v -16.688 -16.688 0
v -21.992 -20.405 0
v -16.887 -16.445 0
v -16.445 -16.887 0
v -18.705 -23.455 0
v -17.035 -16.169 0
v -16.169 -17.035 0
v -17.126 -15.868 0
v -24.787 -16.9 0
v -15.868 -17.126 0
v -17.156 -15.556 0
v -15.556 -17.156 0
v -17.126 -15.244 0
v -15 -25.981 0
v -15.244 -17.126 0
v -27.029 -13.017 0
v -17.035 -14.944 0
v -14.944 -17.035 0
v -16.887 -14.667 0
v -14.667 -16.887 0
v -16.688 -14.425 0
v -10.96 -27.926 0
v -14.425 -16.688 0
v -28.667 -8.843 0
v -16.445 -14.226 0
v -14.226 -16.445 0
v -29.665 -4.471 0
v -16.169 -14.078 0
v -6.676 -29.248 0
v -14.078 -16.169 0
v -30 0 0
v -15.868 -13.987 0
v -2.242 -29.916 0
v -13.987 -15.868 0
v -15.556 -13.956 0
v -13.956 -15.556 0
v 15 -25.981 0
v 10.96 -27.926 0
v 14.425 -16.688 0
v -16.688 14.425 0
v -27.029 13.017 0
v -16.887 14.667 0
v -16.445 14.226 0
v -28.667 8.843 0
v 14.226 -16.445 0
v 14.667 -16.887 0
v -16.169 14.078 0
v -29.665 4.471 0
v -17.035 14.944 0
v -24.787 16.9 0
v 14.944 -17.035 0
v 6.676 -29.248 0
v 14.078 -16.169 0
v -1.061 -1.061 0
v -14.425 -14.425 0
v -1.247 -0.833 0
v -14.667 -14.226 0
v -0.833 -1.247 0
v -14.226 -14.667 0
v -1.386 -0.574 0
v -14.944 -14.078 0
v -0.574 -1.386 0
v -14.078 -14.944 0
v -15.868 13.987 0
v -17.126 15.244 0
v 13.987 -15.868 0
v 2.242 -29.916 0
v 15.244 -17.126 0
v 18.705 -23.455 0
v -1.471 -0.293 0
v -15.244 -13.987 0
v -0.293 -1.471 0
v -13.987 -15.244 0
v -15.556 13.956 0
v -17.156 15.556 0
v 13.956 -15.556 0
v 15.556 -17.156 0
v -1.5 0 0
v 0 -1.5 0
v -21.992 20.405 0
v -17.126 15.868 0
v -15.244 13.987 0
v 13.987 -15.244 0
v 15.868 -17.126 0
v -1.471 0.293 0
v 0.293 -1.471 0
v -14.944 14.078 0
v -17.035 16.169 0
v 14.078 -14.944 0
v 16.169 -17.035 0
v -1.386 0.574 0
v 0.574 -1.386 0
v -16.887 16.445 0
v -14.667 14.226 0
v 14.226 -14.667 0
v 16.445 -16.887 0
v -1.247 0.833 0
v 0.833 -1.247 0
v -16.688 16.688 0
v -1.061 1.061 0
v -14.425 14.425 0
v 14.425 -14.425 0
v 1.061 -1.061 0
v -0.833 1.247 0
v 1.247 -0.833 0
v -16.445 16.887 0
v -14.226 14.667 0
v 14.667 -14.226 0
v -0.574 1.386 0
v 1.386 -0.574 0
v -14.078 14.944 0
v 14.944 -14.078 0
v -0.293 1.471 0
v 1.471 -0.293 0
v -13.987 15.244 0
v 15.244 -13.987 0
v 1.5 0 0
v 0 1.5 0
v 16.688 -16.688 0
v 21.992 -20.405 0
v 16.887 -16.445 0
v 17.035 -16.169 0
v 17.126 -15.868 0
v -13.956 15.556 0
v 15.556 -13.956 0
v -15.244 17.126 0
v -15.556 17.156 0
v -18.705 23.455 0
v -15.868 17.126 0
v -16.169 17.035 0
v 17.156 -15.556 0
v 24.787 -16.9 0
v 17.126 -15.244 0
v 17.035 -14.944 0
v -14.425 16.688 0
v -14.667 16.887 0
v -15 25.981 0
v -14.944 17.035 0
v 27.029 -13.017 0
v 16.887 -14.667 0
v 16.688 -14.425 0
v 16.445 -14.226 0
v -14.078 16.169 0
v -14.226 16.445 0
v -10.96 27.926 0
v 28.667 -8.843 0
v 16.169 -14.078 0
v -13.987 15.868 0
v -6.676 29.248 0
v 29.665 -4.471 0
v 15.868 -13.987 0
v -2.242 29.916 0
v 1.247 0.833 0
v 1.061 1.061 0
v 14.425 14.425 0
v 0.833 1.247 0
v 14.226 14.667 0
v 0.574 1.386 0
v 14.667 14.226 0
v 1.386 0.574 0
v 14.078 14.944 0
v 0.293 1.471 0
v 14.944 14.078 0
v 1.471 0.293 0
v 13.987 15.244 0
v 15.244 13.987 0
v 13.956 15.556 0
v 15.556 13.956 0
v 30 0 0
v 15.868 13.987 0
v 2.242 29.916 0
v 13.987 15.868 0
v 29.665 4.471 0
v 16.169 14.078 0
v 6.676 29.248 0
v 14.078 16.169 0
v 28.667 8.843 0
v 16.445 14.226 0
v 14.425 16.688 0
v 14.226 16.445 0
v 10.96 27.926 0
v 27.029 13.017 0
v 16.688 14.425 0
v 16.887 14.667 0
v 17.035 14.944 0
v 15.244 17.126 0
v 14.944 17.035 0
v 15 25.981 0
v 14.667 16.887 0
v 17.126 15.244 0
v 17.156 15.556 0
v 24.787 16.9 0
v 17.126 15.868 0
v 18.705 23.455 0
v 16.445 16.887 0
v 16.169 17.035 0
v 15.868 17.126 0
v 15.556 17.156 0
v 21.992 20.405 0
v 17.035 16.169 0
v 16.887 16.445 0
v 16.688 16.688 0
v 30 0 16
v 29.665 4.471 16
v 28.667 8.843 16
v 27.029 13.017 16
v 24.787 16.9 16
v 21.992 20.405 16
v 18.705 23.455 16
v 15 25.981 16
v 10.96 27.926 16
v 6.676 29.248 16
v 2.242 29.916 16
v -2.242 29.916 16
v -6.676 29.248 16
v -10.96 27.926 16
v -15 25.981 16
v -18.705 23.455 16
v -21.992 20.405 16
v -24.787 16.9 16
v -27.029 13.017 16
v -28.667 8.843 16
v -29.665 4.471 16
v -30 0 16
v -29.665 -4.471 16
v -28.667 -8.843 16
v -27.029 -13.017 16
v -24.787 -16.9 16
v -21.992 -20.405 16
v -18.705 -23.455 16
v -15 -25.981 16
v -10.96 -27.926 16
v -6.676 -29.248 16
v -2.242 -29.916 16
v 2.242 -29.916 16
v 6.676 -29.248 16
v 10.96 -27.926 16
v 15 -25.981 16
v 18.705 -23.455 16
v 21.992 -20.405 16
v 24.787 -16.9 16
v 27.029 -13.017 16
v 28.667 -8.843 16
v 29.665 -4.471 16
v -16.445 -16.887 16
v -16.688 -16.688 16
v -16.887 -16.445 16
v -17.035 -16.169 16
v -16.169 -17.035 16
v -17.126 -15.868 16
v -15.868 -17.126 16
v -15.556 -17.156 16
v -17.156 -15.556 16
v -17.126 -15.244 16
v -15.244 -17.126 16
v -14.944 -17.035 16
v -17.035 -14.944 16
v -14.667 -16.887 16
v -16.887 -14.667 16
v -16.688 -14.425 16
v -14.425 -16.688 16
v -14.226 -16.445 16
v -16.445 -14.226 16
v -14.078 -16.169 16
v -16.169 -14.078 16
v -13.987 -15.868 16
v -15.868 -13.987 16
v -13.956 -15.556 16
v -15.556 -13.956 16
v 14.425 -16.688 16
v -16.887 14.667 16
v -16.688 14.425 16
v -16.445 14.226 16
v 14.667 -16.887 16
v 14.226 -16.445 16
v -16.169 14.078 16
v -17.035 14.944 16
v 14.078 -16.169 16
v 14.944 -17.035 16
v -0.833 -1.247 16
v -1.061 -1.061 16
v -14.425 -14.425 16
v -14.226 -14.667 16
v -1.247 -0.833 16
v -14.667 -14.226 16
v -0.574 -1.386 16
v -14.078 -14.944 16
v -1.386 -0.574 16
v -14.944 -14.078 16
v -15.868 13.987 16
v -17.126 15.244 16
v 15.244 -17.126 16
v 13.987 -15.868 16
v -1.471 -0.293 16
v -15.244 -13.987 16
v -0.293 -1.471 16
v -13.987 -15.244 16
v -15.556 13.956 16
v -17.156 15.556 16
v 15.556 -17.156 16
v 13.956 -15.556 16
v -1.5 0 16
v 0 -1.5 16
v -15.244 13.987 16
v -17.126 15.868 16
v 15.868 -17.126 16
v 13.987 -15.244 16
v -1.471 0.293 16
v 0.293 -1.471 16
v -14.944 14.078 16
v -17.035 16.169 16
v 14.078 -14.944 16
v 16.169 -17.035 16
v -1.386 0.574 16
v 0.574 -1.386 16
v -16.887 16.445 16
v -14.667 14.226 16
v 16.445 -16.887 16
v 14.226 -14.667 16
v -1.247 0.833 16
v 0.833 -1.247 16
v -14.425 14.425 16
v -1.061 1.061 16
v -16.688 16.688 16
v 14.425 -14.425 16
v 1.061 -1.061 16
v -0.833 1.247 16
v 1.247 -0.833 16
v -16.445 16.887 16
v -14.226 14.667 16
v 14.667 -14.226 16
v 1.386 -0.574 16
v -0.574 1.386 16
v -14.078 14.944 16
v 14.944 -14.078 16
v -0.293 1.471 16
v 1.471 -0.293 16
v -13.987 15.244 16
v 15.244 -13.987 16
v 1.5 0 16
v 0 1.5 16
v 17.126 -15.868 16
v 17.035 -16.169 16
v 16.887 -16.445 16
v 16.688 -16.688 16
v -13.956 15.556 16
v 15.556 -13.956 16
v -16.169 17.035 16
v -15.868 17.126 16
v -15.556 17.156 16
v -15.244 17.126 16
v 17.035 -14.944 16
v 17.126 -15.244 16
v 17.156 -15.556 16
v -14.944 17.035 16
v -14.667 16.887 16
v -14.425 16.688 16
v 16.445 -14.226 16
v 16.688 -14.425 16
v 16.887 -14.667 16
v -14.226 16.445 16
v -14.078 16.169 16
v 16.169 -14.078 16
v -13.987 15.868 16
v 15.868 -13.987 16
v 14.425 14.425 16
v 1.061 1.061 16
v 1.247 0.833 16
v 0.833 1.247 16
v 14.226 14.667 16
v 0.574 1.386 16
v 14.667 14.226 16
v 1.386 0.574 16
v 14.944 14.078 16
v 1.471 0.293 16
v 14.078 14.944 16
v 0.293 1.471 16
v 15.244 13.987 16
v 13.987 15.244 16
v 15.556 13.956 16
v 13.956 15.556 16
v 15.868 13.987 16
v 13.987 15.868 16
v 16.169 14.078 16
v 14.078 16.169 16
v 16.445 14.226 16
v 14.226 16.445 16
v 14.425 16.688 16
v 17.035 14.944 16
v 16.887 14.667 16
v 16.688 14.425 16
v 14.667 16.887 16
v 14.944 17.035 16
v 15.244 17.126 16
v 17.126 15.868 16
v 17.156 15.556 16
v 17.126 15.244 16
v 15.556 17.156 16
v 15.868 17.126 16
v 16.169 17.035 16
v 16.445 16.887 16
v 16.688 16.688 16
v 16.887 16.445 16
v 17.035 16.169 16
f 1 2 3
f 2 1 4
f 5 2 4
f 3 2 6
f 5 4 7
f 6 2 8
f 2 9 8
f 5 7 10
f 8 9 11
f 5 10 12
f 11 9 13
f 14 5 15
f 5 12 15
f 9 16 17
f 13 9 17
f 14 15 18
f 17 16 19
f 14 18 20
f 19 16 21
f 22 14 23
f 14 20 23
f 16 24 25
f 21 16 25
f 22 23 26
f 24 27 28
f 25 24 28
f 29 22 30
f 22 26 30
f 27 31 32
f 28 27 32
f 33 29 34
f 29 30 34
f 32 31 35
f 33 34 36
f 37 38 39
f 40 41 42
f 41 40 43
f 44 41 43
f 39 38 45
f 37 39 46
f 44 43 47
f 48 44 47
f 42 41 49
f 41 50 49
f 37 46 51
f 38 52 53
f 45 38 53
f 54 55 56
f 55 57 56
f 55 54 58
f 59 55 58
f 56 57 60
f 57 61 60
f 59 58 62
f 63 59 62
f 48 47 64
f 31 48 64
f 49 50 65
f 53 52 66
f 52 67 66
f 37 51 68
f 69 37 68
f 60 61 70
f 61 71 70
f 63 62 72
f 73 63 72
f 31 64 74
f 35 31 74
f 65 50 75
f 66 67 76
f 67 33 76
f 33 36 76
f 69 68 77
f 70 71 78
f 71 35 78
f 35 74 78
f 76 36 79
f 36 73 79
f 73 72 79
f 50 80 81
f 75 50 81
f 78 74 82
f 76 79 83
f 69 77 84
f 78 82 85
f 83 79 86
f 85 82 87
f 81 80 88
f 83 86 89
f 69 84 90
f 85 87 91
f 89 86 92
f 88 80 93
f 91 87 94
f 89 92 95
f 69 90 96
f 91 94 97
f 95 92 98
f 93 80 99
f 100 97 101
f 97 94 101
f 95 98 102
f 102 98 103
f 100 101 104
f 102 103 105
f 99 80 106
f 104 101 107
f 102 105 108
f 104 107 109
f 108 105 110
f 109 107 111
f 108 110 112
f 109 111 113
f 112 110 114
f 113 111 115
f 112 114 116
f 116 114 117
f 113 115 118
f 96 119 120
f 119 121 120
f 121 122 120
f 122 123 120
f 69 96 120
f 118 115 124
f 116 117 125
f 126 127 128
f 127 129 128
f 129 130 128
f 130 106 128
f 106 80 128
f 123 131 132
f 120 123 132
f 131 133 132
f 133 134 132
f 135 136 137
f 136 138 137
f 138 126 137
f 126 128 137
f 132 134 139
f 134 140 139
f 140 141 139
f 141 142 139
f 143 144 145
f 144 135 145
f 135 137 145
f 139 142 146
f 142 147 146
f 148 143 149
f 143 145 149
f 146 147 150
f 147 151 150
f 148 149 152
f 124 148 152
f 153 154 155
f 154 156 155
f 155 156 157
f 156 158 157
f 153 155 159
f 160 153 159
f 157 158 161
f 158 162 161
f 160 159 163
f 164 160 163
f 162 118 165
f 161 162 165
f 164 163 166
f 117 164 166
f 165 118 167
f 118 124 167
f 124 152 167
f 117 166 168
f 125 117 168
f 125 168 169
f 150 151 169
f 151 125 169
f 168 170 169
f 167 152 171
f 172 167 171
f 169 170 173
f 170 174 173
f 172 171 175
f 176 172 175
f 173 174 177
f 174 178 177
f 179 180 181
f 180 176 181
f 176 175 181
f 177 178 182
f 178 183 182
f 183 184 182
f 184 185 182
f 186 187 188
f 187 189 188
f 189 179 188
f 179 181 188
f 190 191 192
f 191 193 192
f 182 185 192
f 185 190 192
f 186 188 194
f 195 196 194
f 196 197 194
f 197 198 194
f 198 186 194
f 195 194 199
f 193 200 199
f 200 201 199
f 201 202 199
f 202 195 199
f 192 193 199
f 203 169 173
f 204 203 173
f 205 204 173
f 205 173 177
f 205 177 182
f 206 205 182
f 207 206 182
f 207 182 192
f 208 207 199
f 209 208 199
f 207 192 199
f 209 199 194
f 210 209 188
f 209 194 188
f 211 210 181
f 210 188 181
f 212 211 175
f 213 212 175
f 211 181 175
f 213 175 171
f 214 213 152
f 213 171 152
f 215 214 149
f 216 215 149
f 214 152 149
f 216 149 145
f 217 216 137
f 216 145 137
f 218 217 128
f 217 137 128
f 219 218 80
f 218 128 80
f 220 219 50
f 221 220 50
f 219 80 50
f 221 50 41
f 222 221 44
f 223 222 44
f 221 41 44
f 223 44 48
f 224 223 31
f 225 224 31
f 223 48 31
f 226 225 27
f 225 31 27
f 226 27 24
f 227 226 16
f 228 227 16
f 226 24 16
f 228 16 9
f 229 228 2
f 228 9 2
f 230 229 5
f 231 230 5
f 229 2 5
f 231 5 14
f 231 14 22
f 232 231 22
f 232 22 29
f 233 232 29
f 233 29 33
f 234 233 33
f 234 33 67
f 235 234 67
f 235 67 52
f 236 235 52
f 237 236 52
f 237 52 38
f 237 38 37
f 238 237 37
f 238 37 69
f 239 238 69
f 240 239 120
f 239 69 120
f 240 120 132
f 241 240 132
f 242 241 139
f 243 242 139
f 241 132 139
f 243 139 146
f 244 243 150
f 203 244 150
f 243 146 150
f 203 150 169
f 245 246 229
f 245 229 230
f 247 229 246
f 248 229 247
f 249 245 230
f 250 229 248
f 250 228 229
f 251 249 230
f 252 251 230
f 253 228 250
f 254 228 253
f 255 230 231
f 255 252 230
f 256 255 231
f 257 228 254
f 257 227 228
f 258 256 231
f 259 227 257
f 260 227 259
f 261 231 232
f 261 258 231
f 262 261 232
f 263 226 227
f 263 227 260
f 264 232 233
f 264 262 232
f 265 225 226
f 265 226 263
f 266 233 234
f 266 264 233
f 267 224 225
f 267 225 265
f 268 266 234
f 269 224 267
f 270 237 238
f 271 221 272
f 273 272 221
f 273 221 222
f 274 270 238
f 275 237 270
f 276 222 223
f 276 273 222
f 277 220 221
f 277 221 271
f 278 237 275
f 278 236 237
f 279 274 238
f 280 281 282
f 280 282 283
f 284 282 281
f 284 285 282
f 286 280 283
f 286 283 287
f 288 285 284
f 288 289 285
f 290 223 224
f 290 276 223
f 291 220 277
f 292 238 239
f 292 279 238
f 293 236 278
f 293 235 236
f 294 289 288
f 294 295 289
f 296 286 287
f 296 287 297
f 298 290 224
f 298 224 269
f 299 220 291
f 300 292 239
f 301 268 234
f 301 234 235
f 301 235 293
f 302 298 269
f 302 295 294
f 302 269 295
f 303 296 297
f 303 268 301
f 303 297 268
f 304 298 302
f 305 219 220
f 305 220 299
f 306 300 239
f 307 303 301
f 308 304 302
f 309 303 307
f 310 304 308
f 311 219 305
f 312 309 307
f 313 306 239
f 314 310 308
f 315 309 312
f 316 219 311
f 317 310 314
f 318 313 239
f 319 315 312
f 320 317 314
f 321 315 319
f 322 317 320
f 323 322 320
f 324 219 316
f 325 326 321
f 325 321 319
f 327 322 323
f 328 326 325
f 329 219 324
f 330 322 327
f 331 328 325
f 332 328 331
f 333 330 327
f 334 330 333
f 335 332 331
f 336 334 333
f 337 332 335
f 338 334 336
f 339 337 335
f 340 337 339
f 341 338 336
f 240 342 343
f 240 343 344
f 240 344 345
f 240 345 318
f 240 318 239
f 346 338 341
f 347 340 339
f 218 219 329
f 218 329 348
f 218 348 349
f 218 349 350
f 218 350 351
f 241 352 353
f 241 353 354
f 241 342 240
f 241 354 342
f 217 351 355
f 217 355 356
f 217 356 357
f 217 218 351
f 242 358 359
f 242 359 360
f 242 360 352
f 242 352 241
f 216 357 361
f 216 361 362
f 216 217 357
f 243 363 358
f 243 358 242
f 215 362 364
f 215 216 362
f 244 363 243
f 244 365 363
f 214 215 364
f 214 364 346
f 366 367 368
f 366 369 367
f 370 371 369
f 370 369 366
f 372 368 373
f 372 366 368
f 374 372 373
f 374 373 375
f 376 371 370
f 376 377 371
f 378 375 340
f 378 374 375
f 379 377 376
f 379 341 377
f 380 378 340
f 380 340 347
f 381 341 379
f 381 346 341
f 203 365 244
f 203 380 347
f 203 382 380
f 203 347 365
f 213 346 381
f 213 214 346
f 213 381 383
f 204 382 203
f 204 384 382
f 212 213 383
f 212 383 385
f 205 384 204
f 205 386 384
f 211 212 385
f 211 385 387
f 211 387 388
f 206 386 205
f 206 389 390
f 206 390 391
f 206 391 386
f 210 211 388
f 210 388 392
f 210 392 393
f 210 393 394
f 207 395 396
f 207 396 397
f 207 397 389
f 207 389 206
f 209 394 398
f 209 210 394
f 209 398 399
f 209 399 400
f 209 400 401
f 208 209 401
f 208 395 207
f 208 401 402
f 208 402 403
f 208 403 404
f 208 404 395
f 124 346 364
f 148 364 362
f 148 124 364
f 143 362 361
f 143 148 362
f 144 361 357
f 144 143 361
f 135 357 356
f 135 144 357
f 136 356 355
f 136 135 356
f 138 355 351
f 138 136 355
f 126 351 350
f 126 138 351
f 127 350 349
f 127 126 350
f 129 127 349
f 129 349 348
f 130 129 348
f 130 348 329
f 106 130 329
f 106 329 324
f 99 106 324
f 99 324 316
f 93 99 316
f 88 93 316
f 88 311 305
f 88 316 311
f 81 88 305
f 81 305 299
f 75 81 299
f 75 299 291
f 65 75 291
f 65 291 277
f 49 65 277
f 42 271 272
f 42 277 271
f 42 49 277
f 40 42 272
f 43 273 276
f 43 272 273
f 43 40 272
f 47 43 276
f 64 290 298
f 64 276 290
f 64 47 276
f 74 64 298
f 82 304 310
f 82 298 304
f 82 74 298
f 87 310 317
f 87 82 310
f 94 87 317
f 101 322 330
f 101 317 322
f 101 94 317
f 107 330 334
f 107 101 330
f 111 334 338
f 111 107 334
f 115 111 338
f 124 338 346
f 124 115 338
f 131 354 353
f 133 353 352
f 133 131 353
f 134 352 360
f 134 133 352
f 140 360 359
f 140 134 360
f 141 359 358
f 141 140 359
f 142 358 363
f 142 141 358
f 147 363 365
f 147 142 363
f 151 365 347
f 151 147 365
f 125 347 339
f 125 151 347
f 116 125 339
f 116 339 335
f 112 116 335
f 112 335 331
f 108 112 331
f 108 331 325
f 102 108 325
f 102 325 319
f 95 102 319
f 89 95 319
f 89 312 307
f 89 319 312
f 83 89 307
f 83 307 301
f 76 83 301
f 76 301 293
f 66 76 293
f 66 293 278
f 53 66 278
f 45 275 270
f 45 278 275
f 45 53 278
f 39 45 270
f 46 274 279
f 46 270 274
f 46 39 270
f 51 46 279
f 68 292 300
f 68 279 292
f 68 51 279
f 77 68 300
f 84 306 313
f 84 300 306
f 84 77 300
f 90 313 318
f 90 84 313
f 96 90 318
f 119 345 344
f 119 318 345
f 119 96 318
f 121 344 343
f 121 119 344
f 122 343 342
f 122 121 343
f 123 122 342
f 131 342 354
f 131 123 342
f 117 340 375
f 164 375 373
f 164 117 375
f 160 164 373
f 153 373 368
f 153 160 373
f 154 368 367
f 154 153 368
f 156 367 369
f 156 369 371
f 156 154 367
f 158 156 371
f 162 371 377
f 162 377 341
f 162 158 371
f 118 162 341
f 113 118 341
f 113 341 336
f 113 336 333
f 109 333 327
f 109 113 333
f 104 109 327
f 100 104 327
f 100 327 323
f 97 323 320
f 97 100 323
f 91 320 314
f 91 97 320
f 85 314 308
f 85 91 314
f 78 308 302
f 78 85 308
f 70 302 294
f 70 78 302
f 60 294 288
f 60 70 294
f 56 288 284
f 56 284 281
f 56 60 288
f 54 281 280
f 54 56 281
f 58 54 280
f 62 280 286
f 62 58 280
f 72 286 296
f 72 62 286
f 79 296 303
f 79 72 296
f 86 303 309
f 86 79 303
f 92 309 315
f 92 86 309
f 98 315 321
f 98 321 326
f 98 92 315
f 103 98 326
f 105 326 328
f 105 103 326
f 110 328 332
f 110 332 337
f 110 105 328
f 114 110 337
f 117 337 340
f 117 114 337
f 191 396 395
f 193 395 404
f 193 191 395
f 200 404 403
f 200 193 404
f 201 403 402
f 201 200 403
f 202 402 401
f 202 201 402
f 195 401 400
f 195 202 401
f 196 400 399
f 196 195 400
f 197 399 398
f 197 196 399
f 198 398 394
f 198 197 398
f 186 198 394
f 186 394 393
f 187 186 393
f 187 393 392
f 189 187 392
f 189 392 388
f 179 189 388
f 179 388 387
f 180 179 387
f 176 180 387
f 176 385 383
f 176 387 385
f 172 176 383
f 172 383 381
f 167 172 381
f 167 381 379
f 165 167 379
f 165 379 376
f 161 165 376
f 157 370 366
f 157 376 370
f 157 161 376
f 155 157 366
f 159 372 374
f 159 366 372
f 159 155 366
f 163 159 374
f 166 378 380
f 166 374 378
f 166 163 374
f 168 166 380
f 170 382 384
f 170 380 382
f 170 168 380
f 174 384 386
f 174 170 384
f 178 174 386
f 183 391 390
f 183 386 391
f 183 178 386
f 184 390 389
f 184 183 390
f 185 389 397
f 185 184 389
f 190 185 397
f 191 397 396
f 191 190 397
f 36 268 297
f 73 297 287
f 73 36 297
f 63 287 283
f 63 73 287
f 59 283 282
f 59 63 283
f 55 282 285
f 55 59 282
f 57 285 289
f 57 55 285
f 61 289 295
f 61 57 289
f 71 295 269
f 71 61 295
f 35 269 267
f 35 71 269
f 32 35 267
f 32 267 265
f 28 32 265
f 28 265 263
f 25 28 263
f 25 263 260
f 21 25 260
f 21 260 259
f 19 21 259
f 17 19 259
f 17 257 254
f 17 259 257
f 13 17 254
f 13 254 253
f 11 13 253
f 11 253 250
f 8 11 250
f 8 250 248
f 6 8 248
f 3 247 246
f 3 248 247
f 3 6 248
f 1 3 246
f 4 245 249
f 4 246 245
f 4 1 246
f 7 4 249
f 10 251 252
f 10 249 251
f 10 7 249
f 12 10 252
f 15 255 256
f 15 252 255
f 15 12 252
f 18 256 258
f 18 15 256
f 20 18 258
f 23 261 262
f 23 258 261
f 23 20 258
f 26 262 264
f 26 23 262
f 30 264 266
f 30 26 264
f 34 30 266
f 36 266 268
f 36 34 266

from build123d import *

# Parameters (mm, degrees)
SKETCH1_R           = 30
SKETCH1_R_2         = 1.5
BOSS_EXTRUDE1_DEPTH = 16
SKETCH2_R           = 1.6
CUT_EXTRUDE2_DEPTH  = 17


with BuildPart() as part:
    # Sketch1 → Boss-Extrude1 (new body)
    with BuildSketch(Plane.XY):
        Circle(SKETCH1_R)
        Circle(SKETCH1_R_2, mode=Mode.SUBTRACT)
    extrude(amount=BOSS_EXTRUDE1_DEPTH)

    # Sketch2 → Cut-Extrude2 (cut)
    with BuildSketch(Plane.XY):
        with Locations((15.556349186, 15.556349186)):
            Circle(SKETCH2_R)
        with Locations((-15.556349186, 15.556349186)):
            Circle(SKETCH2_R)
        with Locations((-15.556349186, -15.556349186)):
            Circle(SKETCH2_R)
        with Locations((15.556349186, -15.556349186)):
            Circle(SKETCH2_R)
    extrude(amount=CUT_EXTRUDE2_DEPTH, mode=Mode.SUBTRACT)


solid = part.part
